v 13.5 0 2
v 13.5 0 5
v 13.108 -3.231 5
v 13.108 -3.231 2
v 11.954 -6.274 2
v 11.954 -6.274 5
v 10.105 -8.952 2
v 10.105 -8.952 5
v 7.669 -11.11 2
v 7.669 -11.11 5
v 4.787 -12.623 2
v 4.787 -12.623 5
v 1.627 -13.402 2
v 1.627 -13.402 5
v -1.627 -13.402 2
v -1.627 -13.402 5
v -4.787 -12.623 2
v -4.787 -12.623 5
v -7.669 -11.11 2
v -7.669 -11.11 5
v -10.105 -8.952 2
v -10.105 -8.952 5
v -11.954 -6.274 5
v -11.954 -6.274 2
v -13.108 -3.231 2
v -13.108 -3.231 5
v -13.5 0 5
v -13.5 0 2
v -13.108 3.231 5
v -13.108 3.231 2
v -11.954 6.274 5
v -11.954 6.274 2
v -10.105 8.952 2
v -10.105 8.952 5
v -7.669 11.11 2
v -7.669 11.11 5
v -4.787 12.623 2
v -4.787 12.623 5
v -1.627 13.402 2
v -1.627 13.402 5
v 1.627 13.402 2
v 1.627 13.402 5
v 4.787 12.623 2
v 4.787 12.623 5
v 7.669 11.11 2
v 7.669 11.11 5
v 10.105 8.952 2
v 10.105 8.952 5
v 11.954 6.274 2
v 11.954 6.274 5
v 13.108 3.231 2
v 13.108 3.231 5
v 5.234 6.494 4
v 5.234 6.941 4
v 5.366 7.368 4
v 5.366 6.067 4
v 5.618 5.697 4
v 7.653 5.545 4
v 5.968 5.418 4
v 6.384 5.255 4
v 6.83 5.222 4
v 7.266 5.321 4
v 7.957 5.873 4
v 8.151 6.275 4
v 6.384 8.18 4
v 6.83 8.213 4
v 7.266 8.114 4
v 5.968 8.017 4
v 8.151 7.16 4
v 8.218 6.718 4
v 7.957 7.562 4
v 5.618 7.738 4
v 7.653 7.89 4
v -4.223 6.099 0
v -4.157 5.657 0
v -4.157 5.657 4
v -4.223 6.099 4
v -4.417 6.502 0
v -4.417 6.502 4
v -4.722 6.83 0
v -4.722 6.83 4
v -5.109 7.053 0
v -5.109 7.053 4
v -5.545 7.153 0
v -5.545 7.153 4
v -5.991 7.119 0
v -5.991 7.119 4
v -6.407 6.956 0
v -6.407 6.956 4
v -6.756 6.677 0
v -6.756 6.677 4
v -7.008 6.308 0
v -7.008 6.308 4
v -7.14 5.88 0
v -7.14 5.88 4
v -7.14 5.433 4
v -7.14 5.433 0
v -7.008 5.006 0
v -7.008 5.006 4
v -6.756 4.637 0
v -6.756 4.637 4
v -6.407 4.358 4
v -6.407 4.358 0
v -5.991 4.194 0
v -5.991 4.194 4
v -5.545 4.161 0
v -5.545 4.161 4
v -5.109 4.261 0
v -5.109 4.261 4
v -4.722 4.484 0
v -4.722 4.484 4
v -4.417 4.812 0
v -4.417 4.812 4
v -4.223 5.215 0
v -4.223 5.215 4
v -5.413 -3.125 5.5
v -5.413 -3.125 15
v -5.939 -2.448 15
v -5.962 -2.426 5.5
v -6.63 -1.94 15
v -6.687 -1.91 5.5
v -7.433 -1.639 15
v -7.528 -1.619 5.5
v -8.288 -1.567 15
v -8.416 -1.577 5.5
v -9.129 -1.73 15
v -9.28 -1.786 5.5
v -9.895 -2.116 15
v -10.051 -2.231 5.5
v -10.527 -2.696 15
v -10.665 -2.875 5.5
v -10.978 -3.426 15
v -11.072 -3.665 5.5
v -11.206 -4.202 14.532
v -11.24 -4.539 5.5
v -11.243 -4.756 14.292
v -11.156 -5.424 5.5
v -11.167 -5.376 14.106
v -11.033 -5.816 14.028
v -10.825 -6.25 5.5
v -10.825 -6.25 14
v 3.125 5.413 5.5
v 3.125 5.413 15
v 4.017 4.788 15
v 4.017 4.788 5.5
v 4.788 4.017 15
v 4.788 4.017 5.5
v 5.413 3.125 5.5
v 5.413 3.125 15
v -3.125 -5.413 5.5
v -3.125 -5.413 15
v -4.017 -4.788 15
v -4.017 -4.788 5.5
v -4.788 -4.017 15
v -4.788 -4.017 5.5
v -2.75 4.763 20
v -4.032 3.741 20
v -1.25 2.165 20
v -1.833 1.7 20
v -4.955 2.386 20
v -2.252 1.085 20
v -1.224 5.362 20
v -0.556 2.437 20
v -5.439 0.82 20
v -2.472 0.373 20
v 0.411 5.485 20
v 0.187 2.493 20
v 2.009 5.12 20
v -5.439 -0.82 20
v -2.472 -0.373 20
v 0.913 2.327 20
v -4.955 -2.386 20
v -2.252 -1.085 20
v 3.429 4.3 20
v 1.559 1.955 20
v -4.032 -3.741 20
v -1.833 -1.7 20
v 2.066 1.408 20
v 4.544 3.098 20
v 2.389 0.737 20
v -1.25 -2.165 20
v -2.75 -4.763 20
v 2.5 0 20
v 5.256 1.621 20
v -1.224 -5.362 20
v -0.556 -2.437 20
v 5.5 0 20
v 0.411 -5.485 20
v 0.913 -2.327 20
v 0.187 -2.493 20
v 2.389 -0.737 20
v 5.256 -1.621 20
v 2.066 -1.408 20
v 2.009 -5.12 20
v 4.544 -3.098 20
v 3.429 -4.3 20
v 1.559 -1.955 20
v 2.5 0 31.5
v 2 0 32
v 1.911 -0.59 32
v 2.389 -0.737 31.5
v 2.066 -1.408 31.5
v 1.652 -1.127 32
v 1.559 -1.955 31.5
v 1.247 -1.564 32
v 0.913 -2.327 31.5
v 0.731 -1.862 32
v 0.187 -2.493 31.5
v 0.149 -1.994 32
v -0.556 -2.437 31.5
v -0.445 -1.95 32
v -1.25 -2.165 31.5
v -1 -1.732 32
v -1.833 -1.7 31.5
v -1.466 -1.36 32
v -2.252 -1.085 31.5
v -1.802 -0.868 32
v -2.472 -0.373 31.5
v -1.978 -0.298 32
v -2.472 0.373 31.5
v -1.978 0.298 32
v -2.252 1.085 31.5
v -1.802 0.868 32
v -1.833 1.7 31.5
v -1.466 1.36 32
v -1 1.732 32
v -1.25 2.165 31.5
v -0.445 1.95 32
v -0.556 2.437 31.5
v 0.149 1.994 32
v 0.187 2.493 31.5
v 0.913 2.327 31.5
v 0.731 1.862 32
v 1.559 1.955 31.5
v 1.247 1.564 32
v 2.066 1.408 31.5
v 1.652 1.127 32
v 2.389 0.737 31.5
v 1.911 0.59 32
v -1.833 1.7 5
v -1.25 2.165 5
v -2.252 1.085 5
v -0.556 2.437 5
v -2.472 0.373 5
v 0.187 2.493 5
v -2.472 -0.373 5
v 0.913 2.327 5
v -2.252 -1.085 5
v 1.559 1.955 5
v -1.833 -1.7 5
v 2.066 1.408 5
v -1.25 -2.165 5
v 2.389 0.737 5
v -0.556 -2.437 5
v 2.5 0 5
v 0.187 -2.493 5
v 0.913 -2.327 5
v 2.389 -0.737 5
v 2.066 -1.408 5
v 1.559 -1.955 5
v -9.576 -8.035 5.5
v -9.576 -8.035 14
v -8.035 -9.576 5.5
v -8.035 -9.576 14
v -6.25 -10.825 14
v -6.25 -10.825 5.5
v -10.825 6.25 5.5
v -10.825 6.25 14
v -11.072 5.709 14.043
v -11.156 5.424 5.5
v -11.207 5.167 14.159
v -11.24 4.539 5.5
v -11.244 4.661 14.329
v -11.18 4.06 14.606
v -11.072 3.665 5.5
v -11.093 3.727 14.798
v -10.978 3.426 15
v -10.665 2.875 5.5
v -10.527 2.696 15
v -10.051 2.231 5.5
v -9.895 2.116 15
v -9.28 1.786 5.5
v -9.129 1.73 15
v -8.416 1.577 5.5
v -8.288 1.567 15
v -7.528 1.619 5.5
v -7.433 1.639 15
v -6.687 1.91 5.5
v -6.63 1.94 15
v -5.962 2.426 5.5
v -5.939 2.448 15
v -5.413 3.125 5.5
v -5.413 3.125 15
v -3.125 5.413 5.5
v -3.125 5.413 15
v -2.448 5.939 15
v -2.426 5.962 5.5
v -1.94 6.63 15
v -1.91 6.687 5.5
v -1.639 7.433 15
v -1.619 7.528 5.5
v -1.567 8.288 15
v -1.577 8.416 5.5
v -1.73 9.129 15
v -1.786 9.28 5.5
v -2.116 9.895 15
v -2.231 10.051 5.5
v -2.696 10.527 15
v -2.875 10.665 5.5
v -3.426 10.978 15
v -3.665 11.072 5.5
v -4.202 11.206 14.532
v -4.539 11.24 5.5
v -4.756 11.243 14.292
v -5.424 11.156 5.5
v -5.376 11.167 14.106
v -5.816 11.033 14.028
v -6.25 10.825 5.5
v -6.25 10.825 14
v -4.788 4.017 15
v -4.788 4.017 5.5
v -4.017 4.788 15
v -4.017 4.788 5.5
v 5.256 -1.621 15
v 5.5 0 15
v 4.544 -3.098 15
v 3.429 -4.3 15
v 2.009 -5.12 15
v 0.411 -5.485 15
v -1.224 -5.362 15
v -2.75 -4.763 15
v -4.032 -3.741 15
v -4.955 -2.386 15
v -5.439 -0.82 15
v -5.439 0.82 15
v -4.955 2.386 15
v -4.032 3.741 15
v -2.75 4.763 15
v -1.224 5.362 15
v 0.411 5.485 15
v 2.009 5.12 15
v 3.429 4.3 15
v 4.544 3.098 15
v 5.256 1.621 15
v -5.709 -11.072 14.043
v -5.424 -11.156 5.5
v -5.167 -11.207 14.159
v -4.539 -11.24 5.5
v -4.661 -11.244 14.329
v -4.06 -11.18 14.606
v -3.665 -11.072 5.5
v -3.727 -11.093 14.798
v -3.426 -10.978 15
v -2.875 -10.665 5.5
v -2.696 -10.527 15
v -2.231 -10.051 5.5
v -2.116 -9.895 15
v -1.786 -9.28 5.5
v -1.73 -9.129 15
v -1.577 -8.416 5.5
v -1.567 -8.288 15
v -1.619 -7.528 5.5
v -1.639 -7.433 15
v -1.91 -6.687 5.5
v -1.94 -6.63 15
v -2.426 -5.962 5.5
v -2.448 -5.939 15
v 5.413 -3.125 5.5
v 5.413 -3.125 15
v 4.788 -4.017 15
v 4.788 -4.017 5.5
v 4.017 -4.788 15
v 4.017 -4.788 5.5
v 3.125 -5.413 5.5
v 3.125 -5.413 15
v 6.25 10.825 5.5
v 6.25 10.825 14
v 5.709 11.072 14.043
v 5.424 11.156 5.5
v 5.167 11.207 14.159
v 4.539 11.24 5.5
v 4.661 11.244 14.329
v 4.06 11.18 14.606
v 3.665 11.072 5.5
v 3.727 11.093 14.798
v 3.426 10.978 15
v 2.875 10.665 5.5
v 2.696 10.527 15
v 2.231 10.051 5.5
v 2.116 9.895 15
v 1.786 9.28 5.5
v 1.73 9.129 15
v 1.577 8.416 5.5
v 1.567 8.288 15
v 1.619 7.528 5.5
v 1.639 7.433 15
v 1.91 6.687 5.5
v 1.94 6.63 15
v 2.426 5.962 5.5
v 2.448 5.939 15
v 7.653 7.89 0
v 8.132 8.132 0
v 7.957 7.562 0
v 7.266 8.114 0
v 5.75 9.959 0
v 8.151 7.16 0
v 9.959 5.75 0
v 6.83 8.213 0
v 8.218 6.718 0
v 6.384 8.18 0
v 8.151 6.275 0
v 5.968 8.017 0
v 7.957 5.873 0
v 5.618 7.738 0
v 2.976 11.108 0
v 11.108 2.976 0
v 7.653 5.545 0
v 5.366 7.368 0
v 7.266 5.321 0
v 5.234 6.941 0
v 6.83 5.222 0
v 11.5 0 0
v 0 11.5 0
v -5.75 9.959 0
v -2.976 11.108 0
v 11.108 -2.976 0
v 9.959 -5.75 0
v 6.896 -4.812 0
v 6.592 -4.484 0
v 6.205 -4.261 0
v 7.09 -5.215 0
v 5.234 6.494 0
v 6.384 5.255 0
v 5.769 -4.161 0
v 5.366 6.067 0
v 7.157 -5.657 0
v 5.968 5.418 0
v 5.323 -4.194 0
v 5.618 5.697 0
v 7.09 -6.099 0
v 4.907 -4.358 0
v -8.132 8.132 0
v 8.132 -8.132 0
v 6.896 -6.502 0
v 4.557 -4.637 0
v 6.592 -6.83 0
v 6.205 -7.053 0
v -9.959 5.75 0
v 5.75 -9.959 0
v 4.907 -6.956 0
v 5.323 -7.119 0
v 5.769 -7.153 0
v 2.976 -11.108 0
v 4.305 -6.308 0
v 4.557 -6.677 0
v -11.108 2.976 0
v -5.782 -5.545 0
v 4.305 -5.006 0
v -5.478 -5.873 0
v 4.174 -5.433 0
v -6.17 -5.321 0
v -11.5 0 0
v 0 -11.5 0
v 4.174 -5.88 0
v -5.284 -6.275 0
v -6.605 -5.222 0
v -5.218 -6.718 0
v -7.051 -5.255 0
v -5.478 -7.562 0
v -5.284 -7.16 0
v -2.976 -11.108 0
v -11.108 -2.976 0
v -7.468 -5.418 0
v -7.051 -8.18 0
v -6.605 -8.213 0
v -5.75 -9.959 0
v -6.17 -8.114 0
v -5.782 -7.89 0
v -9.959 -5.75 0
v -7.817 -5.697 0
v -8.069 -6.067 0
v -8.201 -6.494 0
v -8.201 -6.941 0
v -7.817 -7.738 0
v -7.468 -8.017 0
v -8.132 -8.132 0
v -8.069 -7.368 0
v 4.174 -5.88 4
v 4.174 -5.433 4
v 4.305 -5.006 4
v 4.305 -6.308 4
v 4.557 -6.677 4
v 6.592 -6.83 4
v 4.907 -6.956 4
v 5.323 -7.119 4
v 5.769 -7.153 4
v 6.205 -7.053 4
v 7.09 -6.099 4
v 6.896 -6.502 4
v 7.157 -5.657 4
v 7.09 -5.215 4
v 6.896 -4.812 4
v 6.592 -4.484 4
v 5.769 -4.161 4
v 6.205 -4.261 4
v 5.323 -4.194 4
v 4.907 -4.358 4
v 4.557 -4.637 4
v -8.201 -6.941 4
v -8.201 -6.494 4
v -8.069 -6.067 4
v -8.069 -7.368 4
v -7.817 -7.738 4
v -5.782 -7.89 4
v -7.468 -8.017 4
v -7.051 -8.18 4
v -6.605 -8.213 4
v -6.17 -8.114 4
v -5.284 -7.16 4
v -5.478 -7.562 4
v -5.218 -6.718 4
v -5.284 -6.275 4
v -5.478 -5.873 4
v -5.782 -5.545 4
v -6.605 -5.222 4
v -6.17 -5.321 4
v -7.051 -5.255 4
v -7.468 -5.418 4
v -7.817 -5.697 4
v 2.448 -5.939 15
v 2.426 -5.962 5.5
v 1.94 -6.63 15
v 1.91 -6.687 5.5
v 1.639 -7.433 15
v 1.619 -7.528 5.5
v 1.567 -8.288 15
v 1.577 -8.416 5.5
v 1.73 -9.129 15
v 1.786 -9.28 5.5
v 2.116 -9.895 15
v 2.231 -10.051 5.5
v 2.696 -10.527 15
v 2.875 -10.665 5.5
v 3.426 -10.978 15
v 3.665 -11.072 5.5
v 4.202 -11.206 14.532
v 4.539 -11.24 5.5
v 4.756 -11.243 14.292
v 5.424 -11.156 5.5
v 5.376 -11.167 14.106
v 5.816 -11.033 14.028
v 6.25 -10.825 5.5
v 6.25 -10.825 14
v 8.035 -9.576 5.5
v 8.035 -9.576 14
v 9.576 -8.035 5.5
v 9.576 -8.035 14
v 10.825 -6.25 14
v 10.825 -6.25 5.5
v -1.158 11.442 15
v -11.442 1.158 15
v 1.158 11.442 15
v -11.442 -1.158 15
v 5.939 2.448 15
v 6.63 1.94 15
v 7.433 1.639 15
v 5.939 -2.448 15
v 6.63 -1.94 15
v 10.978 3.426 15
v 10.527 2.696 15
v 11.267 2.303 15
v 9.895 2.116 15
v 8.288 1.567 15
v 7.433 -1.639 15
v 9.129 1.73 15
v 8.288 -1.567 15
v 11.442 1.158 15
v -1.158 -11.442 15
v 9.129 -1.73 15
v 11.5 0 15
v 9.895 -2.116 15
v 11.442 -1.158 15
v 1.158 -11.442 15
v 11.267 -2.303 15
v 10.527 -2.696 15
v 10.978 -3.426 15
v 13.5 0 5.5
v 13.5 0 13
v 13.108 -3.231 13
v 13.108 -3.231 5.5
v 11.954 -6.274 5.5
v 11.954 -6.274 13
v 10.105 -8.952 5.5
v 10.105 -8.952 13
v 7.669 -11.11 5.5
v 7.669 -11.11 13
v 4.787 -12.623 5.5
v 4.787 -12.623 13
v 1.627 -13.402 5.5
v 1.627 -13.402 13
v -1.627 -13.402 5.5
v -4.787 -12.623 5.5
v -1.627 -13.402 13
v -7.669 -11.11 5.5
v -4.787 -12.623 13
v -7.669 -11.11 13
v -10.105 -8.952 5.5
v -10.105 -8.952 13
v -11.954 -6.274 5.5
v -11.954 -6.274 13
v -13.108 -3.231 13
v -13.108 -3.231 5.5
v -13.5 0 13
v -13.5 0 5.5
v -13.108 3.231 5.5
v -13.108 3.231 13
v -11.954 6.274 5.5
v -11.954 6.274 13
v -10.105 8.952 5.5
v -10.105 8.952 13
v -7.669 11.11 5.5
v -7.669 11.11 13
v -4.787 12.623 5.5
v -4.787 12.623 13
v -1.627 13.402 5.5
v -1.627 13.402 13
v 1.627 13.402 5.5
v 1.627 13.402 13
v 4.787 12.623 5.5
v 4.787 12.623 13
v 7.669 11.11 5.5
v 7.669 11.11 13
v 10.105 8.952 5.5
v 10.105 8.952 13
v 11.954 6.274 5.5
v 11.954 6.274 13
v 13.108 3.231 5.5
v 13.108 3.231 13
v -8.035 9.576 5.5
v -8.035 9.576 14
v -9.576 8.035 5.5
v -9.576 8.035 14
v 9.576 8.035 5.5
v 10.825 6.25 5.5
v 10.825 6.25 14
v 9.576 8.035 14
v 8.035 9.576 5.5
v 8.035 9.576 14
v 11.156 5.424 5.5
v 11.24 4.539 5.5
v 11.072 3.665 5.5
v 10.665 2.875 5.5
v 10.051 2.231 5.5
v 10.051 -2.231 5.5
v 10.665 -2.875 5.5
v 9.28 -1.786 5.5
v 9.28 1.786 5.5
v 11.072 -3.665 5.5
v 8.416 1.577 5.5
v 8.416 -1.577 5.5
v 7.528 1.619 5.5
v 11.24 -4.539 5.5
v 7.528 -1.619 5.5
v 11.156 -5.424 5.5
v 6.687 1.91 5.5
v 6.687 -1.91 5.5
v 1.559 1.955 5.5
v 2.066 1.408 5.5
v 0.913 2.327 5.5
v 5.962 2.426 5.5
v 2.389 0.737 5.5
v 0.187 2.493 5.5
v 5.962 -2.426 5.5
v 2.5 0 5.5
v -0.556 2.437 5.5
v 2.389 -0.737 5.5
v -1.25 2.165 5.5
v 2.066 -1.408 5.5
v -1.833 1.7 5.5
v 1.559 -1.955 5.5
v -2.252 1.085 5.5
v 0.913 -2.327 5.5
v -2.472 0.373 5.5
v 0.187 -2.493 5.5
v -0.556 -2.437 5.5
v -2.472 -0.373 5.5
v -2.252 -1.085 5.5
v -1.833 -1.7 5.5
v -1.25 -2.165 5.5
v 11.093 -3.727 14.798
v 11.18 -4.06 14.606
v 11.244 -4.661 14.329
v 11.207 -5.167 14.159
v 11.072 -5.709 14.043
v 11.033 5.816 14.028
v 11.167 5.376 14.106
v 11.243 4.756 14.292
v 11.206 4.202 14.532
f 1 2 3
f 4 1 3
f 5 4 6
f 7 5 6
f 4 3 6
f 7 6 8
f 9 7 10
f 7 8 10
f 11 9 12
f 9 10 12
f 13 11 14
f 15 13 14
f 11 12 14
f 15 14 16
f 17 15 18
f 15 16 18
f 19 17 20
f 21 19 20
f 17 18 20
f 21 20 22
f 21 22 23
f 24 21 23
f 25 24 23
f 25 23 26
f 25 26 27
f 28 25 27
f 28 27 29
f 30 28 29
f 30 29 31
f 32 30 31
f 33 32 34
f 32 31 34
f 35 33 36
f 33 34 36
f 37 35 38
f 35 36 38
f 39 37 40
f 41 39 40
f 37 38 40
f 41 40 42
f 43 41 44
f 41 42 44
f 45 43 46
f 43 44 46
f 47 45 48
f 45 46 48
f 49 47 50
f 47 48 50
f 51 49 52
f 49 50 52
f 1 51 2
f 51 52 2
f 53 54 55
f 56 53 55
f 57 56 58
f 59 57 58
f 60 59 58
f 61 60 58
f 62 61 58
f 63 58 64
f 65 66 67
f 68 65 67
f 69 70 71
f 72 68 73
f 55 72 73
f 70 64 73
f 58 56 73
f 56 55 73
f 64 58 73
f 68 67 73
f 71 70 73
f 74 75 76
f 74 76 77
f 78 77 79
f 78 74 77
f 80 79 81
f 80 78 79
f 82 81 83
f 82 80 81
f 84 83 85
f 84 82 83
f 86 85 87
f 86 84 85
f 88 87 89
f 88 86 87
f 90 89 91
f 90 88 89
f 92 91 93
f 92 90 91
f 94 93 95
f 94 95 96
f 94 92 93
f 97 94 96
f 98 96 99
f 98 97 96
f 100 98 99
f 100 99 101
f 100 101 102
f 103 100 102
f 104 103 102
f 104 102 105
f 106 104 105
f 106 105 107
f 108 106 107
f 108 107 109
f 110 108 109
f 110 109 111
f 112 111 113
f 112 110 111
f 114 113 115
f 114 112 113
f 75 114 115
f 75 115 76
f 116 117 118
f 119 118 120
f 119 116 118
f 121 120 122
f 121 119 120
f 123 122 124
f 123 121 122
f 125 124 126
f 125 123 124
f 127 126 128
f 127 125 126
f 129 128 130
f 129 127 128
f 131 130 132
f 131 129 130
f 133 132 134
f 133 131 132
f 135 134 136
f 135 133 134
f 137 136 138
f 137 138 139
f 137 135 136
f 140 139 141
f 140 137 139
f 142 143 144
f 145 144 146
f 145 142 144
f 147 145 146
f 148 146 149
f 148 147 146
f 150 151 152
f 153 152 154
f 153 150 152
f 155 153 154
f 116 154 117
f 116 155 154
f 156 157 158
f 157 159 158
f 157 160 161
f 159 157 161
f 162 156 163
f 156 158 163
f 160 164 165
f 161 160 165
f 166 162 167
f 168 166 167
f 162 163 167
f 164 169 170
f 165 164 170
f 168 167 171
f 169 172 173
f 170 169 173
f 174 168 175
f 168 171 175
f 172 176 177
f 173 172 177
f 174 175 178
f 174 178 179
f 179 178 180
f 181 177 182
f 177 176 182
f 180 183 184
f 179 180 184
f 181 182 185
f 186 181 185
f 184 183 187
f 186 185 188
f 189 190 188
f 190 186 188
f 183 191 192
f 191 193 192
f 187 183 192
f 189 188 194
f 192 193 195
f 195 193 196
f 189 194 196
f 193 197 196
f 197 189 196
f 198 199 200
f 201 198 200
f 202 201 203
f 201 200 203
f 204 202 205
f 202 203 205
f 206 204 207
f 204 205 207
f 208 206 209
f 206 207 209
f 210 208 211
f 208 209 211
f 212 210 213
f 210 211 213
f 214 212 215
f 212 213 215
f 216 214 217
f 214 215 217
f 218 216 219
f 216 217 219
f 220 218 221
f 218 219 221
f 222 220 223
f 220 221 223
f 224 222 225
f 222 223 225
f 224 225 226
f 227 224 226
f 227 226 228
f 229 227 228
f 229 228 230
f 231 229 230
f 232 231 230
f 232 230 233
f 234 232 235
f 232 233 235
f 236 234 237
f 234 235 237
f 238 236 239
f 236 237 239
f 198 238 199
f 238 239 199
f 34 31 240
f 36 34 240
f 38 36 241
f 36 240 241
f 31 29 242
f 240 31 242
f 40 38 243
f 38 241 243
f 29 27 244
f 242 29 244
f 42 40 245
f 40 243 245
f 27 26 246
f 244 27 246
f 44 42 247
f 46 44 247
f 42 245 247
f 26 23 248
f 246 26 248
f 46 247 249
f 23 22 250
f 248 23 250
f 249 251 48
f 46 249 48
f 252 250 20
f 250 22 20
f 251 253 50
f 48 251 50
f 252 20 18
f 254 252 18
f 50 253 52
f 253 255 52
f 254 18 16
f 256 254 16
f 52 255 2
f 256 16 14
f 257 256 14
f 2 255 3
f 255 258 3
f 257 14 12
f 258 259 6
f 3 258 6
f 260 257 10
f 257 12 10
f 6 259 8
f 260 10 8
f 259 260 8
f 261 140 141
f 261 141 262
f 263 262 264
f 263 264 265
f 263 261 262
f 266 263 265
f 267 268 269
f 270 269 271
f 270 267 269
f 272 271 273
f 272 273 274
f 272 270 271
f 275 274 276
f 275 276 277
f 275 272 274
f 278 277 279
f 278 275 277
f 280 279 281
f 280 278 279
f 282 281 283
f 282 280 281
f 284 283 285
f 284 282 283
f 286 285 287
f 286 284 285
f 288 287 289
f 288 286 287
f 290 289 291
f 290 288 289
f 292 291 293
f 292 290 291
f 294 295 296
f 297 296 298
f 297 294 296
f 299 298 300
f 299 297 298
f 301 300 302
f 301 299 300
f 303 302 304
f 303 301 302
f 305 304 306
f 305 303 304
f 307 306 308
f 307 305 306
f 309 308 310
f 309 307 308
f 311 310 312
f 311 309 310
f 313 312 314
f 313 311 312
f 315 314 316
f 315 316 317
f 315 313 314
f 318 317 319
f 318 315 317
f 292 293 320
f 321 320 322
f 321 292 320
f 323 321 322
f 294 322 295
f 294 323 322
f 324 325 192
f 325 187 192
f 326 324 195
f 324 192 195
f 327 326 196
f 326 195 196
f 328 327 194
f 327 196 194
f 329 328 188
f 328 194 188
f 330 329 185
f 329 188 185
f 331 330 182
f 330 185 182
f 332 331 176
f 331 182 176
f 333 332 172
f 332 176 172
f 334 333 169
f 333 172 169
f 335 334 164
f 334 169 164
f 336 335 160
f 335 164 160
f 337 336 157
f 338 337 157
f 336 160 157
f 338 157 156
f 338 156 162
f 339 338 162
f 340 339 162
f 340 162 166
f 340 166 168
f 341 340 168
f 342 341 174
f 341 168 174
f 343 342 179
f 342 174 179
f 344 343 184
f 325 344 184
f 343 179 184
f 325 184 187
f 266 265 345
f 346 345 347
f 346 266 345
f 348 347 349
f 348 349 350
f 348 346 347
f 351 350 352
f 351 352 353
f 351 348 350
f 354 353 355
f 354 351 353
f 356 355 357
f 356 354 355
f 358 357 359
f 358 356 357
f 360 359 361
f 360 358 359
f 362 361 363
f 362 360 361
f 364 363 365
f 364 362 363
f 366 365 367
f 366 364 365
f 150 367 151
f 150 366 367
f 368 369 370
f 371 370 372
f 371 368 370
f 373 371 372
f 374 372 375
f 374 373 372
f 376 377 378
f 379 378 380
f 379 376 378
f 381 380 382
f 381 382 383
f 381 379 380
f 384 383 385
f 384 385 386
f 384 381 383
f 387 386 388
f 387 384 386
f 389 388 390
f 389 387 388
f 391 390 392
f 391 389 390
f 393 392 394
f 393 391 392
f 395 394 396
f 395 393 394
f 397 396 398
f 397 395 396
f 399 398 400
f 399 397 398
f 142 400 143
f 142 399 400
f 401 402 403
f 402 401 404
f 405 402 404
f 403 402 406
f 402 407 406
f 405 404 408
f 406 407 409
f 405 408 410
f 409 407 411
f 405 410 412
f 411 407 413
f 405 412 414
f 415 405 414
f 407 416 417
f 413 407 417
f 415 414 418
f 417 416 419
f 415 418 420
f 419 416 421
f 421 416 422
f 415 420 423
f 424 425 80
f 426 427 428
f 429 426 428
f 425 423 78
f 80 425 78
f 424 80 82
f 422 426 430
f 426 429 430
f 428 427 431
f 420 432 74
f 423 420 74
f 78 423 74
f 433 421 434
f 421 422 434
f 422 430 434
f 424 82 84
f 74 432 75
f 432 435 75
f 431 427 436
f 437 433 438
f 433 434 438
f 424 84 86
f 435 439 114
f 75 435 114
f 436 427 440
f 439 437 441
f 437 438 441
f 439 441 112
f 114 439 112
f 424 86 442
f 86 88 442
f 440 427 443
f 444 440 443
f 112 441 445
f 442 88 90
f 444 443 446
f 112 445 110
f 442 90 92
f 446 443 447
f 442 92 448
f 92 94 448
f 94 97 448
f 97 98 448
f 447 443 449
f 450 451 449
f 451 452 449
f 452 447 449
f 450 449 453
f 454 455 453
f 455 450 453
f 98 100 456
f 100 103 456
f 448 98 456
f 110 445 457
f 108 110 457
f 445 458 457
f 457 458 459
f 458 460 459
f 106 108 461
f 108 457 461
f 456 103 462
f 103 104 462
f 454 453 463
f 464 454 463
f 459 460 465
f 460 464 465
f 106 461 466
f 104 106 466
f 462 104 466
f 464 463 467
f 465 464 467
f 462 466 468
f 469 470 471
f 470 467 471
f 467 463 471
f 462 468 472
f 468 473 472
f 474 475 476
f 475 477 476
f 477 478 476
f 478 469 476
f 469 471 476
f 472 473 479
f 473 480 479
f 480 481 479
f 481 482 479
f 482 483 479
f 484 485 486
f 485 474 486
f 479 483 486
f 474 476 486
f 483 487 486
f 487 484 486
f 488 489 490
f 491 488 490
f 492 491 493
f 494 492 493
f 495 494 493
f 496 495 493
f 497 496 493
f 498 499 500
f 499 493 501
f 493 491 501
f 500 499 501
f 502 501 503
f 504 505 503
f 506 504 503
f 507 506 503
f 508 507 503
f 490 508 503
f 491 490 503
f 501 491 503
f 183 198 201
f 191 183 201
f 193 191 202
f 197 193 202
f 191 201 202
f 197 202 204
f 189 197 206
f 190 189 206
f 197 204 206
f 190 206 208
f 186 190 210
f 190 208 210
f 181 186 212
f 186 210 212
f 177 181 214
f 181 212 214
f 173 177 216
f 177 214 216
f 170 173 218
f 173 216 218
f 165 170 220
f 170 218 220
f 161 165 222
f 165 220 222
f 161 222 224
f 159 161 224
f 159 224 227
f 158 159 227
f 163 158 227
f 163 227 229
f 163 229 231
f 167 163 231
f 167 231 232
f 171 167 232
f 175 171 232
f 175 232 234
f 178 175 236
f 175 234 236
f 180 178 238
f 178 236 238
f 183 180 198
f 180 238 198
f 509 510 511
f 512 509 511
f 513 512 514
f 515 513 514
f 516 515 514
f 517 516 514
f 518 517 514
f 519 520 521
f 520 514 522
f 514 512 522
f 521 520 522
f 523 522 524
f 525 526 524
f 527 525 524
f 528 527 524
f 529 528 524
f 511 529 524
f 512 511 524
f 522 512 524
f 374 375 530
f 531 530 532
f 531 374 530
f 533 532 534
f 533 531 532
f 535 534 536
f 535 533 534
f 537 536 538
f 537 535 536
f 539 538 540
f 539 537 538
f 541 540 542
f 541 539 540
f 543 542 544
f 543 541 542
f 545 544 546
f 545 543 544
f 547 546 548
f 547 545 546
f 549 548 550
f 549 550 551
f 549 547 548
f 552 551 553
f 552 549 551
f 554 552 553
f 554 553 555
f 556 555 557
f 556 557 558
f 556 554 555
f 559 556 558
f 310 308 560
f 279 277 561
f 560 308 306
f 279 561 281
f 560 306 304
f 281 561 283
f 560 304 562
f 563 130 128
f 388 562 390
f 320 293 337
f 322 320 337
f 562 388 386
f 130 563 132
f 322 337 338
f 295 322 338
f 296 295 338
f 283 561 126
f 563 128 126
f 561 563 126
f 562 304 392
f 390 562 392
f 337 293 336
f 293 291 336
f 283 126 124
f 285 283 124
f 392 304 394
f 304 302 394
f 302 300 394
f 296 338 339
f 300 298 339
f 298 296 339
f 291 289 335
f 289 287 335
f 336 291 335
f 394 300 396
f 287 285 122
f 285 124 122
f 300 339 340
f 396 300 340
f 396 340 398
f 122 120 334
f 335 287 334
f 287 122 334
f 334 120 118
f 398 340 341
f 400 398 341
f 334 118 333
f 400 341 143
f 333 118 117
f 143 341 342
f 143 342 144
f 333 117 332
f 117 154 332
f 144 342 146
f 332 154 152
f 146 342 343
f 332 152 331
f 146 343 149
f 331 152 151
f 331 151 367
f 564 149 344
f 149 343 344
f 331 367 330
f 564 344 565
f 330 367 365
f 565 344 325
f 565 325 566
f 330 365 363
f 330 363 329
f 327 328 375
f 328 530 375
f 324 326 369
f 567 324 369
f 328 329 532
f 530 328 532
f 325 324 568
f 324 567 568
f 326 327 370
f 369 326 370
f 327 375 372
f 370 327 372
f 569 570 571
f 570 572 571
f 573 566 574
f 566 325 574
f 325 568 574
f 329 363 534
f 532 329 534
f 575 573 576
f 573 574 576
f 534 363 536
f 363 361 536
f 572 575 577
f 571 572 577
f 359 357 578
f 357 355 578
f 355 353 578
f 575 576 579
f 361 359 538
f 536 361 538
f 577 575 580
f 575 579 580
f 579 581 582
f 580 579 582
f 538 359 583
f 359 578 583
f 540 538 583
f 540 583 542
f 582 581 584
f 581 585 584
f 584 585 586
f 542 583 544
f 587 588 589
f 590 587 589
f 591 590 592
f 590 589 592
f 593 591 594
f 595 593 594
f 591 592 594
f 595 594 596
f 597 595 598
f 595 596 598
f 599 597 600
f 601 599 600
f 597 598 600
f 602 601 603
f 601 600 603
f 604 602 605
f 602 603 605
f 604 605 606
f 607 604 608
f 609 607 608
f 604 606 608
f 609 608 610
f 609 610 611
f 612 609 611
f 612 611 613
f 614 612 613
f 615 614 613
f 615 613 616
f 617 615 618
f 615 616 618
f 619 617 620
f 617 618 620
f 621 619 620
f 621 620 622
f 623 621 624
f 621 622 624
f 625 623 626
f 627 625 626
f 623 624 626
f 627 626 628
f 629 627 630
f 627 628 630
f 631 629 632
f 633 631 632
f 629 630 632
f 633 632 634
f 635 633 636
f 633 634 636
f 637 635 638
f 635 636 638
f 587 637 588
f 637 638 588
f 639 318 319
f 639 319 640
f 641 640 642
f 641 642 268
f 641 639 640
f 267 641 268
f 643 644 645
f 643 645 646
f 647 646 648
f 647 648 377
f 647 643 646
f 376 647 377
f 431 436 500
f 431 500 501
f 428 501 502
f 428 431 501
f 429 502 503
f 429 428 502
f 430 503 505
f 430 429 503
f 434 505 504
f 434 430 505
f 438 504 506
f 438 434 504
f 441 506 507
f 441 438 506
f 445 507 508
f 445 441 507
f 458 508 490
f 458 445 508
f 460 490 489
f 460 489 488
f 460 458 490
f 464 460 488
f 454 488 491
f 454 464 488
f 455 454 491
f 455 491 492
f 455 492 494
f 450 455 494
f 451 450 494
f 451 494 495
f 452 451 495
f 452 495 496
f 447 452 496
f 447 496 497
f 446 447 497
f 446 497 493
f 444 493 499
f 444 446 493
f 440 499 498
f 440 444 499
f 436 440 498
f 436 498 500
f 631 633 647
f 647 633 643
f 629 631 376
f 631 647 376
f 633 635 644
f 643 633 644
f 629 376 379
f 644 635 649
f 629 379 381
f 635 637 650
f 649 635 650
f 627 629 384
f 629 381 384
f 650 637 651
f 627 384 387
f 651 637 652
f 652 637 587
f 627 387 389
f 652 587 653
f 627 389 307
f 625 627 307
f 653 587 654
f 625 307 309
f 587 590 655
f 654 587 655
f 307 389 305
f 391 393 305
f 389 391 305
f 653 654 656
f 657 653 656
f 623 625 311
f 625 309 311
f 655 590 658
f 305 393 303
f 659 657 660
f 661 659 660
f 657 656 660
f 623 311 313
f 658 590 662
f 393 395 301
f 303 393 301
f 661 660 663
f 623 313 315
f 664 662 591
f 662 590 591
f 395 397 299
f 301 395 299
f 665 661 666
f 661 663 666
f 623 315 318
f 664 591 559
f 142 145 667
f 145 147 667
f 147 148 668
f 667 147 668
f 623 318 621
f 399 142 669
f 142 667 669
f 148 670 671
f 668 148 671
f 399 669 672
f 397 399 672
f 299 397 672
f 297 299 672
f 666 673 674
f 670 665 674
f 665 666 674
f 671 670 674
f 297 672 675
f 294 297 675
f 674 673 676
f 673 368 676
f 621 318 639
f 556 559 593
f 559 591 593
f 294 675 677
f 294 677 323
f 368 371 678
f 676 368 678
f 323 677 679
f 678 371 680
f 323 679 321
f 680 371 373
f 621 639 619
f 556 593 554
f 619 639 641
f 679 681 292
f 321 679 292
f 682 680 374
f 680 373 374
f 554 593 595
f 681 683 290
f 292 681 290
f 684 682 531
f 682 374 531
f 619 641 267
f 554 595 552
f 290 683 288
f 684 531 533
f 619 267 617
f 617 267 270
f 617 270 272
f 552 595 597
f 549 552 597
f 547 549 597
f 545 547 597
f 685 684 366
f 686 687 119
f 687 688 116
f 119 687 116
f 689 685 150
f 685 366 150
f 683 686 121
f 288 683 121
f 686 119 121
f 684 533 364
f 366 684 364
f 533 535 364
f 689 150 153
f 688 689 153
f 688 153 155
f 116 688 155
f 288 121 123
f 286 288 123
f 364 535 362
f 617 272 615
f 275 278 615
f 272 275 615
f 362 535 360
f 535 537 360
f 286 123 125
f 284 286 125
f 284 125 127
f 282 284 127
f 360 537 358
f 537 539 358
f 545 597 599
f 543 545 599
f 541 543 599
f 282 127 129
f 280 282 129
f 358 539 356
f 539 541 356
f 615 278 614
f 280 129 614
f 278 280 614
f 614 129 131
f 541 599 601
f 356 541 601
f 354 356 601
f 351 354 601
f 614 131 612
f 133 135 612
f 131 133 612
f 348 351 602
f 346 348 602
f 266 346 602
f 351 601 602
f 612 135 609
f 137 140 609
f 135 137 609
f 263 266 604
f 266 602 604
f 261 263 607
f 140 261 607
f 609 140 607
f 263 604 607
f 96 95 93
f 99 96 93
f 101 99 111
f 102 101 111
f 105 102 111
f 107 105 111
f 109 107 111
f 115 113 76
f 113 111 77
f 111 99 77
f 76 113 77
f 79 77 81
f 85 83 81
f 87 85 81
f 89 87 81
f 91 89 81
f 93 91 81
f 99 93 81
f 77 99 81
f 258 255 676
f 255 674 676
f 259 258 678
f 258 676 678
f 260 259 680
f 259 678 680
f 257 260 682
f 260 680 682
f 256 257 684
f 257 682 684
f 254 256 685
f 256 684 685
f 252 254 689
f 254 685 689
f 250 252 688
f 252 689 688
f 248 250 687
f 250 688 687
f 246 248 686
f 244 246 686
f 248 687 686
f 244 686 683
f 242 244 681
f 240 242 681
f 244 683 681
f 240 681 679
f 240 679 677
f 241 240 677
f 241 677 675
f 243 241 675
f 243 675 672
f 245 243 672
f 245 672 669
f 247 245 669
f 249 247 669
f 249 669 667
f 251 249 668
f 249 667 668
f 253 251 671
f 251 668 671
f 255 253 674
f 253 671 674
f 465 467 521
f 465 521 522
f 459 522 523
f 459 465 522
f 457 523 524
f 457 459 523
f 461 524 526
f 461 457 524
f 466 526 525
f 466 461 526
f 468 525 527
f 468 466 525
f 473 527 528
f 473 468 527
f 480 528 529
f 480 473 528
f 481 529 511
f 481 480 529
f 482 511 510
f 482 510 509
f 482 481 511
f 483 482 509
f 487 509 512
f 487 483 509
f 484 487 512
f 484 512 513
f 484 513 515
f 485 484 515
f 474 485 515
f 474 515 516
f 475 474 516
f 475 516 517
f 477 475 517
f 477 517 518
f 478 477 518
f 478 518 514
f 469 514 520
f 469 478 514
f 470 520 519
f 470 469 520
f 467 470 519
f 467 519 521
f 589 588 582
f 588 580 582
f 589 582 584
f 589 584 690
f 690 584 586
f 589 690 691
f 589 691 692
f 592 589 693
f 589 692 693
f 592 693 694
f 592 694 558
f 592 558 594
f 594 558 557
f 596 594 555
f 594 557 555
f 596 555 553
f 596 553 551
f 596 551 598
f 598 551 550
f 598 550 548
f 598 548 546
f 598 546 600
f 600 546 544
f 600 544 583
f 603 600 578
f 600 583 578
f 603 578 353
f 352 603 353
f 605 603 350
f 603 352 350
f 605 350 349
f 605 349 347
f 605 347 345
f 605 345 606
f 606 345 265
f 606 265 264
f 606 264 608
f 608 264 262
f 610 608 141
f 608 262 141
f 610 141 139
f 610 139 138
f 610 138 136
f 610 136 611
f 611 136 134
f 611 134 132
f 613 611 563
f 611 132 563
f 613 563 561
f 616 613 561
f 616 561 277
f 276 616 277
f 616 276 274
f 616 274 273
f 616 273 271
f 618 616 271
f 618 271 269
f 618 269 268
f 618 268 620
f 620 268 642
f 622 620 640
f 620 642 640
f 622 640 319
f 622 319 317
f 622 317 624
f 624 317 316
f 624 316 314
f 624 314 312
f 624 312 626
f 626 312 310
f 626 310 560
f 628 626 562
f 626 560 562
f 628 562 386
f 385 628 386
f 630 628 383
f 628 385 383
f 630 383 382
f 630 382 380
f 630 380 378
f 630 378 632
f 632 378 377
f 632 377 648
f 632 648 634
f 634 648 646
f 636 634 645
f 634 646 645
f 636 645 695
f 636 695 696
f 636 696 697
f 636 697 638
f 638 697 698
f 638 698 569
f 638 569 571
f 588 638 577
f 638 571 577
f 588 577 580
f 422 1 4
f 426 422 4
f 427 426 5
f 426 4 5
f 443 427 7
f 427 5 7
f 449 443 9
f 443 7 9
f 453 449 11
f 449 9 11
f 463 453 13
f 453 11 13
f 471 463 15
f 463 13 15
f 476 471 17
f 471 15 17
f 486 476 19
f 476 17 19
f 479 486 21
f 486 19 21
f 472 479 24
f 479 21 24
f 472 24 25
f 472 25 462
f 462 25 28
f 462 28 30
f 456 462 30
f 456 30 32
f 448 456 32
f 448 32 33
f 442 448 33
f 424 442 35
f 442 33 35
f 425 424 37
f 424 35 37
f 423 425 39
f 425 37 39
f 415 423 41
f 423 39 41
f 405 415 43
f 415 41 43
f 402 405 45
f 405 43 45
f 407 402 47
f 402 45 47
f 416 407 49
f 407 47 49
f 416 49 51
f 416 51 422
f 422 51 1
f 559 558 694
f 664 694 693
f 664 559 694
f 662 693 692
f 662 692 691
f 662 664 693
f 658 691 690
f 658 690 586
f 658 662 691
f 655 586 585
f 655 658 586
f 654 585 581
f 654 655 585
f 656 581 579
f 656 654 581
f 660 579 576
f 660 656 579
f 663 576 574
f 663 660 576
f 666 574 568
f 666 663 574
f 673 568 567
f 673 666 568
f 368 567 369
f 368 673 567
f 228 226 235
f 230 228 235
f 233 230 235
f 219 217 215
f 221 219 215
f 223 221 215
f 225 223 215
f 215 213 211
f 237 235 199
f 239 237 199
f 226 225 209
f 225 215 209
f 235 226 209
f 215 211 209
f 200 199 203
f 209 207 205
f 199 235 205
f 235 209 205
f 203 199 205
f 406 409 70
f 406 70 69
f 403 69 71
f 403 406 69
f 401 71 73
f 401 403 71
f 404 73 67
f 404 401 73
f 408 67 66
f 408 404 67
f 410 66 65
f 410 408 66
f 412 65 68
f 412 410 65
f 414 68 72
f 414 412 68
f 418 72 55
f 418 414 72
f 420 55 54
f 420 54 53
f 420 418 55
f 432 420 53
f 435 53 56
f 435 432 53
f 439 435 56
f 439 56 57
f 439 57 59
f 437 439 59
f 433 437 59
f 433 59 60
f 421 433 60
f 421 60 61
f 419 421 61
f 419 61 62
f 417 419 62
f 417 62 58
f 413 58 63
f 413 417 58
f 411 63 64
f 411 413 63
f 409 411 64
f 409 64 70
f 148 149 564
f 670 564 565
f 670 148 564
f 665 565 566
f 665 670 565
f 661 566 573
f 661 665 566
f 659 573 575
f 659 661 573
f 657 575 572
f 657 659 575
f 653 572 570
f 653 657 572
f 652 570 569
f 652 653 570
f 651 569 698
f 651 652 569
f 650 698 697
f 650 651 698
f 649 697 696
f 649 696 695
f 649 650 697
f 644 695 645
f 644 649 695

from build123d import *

# Parameters (mm, degrees)
F2_SIZE  = 2
F3_SIZE  = 0.5
F6_DEPTH = 27.001
F7_R     = 1.5
F8_DEPTH = 4


with BuildPart() as f1:
    # F0 (on Front) → F1 (revolve)
    with BuildSketch(Plane.XZ):
        Polygon((0, 32), (0, 0), (13.5, 0), (13.5, 5), (2.5, 5), (2.5, 5.5), (13.5, 5.5), (13.5, 15), (5.5, 15), (5.5, 20), (2.5, 20), (2.5, 32), align=None)
    revolve(axis=Axis((0, 0, 16), (0, 0, -1)))

    # F2
    f2_edges = [f1.edges().sort_by_distance(p)[0] for p in [
        (-13.5, 0, 15),
        (-13.5, 0, 0),
    ]]
    chamfer(f2_edges, length=F2_SIZE)

    # F3
    f3_edges = [f1.edges().sort_by_distance(p)[0] for p in [
        (-2.5, 0, 32),
    ]]
    chamfer(f3_edges, length=F3_SIZE)

    # F5 (on offset) → F6 (cut, through all)
    with BuildSketch(Plane.XY.offset(5)):
        with BuildLine():
            ThreePointArc((5.412659, 3.125), (9.681488, 1.981171), (10.825318, 6.25))
            ThreePointArc((10.825318, 6.25), (8.838835, 8.838835), (6.25, 10.825318))
            ThreePointArc((6.25, 10.825318), (1.981171, 9.681488), (3.125, 5.412659))
            ThreePointArc((3.125, 5.412659), (4.419417, 4.419417), (5.412659, 3.125))
        make_face()
        with BuildLine():
            ThreePointArc((-3.125, 5.412659), (-1.981171, 9.681488), (-6.25, 10.825318))
            ThreePointArc((-6.25, 10.825318), (-8.838835, 8.838835), (-10.825318, 6.25))
            ThreePointArc((-10.825318, 6.25), (-9.681488, 1.981171), (-5.412659, 3.125))
            ThreePointArc((-5.412659, 3.125), (-4.419417, 4.419417), (-3.125, 5.412659))
        make_face()
        with BuildLine():
            ThreePointArc((-3.125, -5.412659), (-4.419417, -4.419417), (-5.412659, -3.125))
            ThreePointArc((-5.412659, -3.125), (-9.681488, -1.981171), (-10.825318, -6.25))
            ThreePointArc((-10.825318, -6.25), (-8.838835, -8.838835), (-6.25, -10.825318))
            ThreePointArc((-6.25, -10.825318), (-1.981171, -9.681488), (-3.125, -5.412659))
        make_face()
        with BuildLine():
            ThreePointArc((3.125, -5.412659), (1.981171, -9.681488), (6.25, -10.825318))
            ThreePointArc((6.25, -10.825318), (8.838835, -8.838835), (10.825318, -6.25))
            ThreePointArc((10.825318, -6.25), (9.681488, -1.981171), (5.412659, -3.125))
            ThreePointArc((5.412659, -3.125), (4.419417, -4.419417), (3.125, -5.412659))
        make_face()
    extrude(amount=F6_DEPTH, mode=Mode.SUBTRACT)

    # F7 (on Top) → F8 (cut)
    with BuildSketch(Plane.XY):
        with Locations((-5.656854, 5.656854)):
            Circle(F7_R)
        with Locations((6.717514, 6.717514)):
            Circle(F7_R)
        with Locations((5.656854, -5.656854)):
            Circle(F7_R)
        with Locations((-6.717514, -6.717514)):
            Circle(F7_R)
    extrude(amount=F8_DEPTH, mode=Mode.SUBTRACT)


solid = f1.part
